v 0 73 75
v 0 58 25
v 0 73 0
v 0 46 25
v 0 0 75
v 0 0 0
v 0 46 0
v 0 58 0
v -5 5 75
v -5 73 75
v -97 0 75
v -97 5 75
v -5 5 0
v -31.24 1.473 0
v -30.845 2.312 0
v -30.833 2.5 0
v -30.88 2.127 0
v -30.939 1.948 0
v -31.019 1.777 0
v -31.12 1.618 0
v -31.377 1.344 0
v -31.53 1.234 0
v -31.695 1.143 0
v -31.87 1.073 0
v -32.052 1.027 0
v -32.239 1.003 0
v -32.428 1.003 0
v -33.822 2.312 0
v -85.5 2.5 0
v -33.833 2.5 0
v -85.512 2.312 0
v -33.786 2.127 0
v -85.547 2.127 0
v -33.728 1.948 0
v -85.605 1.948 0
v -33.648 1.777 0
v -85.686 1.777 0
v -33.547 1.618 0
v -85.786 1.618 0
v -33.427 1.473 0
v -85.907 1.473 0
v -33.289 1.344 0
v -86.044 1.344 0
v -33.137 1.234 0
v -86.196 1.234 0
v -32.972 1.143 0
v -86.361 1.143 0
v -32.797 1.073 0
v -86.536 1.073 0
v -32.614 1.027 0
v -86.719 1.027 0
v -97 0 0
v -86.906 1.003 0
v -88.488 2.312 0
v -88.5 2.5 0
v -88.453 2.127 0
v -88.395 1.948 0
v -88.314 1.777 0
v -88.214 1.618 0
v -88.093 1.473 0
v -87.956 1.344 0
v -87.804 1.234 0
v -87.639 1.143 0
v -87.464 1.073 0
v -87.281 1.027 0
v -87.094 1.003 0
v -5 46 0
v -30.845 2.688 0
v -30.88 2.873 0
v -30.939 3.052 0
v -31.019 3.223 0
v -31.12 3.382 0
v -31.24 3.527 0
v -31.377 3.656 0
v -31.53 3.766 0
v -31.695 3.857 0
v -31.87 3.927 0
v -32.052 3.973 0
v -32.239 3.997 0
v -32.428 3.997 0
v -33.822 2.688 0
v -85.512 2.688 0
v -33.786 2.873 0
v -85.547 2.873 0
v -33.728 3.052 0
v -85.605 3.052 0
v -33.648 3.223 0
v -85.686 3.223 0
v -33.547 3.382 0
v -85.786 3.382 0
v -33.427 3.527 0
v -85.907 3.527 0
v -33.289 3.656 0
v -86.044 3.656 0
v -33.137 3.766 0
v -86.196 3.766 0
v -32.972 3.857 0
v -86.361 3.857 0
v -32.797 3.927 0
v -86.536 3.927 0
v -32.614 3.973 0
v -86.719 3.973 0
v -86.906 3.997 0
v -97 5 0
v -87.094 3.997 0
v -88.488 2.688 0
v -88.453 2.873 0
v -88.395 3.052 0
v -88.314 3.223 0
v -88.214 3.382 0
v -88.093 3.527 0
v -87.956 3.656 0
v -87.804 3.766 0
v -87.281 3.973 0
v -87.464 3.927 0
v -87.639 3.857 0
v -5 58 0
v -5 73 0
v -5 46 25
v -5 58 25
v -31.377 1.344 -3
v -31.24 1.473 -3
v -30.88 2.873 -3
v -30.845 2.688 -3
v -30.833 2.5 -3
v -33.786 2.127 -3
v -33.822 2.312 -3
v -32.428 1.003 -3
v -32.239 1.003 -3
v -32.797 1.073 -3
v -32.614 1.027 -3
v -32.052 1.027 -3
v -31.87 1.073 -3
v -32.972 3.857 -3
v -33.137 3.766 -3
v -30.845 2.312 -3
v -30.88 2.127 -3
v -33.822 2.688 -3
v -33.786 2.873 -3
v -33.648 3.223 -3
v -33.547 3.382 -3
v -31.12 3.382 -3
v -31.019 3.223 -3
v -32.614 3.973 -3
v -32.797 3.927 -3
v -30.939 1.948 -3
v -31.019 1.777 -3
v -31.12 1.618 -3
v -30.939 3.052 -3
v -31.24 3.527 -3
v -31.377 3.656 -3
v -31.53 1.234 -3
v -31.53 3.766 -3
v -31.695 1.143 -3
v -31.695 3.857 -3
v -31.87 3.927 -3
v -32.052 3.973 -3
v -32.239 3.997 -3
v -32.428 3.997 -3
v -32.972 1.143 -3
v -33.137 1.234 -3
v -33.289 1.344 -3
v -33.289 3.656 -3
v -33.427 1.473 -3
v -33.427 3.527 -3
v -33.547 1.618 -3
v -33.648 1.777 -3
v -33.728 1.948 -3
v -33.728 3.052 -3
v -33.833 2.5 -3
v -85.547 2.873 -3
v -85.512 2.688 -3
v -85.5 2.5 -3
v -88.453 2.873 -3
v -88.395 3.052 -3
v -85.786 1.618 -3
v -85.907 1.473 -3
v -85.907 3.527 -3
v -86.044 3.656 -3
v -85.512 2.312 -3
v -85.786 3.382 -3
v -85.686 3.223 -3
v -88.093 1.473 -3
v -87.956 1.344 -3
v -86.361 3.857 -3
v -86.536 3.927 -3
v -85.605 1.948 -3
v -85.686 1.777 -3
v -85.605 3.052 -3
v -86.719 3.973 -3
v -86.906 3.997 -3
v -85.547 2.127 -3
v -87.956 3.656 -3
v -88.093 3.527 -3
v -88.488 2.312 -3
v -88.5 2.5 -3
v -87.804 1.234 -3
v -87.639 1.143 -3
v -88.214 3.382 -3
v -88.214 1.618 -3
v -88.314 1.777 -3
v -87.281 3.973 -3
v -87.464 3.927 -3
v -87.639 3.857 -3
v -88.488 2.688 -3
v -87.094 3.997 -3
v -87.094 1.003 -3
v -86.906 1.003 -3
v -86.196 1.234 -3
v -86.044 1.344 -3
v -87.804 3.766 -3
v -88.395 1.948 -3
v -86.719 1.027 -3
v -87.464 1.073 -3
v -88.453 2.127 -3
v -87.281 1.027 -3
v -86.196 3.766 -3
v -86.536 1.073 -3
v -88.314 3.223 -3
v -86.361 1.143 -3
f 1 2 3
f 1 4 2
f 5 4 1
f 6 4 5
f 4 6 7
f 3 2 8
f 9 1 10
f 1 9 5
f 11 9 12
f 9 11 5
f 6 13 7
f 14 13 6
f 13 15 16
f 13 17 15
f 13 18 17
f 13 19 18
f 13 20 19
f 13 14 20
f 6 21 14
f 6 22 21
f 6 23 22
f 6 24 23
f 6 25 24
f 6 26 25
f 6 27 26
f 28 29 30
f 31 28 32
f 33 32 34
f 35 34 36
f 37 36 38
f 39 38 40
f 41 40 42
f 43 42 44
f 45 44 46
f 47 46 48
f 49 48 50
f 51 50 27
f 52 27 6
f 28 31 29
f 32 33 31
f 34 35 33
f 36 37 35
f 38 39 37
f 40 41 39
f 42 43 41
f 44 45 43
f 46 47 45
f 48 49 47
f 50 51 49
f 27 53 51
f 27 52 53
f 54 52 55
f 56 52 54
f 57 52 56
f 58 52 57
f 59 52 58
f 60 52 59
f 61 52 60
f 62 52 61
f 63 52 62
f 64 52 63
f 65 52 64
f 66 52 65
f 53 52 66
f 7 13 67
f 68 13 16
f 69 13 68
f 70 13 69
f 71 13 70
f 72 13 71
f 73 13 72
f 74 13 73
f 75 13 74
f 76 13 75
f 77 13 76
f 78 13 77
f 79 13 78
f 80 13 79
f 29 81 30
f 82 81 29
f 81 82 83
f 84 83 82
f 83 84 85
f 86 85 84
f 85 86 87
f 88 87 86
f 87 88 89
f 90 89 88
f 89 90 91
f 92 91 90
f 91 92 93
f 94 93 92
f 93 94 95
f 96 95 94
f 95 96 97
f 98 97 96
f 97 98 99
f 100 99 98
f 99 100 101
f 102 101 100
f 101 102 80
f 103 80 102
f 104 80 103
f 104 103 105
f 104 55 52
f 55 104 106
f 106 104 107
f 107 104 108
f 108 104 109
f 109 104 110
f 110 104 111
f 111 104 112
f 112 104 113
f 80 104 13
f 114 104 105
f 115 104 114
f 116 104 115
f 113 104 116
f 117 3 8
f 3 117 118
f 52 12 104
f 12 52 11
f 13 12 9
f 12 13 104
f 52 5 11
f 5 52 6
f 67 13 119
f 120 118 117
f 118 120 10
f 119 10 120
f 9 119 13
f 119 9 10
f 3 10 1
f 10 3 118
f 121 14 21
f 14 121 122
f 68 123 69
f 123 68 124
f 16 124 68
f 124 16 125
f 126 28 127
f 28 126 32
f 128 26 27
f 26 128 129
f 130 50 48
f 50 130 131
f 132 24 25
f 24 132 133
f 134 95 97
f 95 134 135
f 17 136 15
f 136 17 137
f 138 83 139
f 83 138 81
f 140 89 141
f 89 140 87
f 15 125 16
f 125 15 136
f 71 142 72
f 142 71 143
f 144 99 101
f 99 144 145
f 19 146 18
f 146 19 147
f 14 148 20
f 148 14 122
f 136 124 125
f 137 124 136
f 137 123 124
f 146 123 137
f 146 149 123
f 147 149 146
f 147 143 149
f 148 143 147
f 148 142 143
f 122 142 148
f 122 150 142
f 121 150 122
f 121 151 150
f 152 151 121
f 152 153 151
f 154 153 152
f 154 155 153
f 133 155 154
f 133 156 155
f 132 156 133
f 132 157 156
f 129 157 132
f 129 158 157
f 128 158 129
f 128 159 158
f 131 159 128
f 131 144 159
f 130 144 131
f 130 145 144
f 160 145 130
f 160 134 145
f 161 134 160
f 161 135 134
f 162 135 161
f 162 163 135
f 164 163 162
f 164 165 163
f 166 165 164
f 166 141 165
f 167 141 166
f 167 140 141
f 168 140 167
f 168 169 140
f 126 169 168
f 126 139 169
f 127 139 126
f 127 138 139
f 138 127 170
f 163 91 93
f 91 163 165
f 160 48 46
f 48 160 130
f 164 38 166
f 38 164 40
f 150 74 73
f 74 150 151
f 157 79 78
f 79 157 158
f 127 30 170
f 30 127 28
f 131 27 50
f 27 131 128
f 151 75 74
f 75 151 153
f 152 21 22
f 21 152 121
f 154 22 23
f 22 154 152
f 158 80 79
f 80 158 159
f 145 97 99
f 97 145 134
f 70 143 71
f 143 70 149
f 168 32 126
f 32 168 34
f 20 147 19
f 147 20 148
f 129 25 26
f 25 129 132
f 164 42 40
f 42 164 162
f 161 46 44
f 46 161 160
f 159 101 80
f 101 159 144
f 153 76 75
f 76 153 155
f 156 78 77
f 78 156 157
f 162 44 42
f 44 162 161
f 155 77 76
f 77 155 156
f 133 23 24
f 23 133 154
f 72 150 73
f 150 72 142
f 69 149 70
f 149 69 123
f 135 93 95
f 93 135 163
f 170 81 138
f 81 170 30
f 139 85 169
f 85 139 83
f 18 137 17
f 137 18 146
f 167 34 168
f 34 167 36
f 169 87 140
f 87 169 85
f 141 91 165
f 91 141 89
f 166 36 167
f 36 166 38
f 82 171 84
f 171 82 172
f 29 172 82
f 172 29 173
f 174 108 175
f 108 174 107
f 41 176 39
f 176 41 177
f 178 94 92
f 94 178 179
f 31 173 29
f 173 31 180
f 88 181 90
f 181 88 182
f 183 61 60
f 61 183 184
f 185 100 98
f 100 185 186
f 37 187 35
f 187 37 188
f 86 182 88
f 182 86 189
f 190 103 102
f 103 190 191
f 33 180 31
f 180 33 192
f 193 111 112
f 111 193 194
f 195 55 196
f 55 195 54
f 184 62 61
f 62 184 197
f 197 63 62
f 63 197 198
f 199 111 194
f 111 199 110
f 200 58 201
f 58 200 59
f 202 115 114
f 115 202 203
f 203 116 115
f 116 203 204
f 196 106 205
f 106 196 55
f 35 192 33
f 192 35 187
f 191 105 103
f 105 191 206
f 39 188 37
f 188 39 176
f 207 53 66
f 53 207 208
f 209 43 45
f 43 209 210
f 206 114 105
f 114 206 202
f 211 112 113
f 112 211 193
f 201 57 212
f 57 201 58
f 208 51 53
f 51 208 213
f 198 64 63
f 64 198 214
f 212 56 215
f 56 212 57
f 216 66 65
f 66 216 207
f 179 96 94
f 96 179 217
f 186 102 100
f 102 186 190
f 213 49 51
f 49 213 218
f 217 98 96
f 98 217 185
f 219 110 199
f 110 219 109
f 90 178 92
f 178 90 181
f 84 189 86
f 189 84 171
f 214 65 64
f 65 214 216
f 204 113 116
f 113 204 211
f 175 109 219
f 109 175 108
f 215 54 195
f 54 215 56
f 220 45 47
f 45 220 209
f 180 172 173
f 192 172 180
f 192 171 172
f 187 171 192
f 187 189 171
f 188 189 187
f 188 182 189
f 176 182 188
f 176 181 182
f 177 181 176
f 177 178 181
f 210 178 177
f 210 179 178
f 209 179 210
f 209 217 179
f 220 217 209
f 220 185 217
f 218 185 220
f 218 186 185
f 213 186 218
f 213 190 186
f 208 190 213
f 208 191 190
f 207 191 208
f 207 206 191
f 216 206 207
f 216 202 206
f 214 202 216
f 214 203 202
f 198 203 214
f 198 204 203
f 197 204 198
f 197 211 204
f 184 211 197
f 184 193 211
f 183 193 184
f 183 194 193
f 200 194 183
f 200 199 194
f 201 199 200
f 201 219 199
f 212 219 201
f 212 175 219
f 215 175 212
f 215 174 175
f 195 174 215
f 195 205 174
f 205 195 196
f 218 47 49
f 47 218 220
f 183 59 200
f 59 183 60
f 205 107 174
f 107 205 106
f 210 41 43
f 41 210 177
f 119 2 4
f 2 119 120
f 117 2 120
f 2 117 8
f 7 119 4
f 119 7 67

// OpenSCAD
//Spessore parete del corridoio, con la porta
spessore_uno=5; 
//lunghezza della prima parete
lunghezza_uno=73; 

//spessore parete divisoria degli ambienti
spessore_due=5;
lunghezza_due = 97; 
//
//altezza uguale per tutte le pareti
altezza=75; 


//dati relativi alla porta
altezza_porta = 25; 
larghezza_porta = 12;
//distanza della porta a partire dall'angolo esterno
distanza_porta = 46;

//parametri relativi alle finestre, ma non ancora inseriti nel modello
lunghezza_fin=15;
 altezza_fin=11;

due_pareti_porta();




//con questa funzione si creano due pareti ad angolo retto
module due_pareti(){
   union(){
   translate([-lunghezza_due,0,0]){ cube([lunghezza_due, spessore_due, altezza]);
   }
   rotate([0,0,90])    cube([lunghezza_uno, spessore_uno, altezza]);
    translate([-lunghezza_due/3,spessore_due/2,-3])cylinder(10, 1.5,1.5, $fn=50);
    translate([-lunghezza_due+10,spessore_due/2,-3])cylinder(10, 1.5,1.5, $fn=50);
   }
}


module due_pareti_porta(){
    
    difference(){
        due_pareti();
        translate([-spessore_due,distanza_porta,0]) cube([spessore_due,larghezza_porta,altezza_porta]);
    }
}

module finestra(){
    
    cube([lunghezza_fin, spessore, altezza_fin]);
    
    }
    
    
    
